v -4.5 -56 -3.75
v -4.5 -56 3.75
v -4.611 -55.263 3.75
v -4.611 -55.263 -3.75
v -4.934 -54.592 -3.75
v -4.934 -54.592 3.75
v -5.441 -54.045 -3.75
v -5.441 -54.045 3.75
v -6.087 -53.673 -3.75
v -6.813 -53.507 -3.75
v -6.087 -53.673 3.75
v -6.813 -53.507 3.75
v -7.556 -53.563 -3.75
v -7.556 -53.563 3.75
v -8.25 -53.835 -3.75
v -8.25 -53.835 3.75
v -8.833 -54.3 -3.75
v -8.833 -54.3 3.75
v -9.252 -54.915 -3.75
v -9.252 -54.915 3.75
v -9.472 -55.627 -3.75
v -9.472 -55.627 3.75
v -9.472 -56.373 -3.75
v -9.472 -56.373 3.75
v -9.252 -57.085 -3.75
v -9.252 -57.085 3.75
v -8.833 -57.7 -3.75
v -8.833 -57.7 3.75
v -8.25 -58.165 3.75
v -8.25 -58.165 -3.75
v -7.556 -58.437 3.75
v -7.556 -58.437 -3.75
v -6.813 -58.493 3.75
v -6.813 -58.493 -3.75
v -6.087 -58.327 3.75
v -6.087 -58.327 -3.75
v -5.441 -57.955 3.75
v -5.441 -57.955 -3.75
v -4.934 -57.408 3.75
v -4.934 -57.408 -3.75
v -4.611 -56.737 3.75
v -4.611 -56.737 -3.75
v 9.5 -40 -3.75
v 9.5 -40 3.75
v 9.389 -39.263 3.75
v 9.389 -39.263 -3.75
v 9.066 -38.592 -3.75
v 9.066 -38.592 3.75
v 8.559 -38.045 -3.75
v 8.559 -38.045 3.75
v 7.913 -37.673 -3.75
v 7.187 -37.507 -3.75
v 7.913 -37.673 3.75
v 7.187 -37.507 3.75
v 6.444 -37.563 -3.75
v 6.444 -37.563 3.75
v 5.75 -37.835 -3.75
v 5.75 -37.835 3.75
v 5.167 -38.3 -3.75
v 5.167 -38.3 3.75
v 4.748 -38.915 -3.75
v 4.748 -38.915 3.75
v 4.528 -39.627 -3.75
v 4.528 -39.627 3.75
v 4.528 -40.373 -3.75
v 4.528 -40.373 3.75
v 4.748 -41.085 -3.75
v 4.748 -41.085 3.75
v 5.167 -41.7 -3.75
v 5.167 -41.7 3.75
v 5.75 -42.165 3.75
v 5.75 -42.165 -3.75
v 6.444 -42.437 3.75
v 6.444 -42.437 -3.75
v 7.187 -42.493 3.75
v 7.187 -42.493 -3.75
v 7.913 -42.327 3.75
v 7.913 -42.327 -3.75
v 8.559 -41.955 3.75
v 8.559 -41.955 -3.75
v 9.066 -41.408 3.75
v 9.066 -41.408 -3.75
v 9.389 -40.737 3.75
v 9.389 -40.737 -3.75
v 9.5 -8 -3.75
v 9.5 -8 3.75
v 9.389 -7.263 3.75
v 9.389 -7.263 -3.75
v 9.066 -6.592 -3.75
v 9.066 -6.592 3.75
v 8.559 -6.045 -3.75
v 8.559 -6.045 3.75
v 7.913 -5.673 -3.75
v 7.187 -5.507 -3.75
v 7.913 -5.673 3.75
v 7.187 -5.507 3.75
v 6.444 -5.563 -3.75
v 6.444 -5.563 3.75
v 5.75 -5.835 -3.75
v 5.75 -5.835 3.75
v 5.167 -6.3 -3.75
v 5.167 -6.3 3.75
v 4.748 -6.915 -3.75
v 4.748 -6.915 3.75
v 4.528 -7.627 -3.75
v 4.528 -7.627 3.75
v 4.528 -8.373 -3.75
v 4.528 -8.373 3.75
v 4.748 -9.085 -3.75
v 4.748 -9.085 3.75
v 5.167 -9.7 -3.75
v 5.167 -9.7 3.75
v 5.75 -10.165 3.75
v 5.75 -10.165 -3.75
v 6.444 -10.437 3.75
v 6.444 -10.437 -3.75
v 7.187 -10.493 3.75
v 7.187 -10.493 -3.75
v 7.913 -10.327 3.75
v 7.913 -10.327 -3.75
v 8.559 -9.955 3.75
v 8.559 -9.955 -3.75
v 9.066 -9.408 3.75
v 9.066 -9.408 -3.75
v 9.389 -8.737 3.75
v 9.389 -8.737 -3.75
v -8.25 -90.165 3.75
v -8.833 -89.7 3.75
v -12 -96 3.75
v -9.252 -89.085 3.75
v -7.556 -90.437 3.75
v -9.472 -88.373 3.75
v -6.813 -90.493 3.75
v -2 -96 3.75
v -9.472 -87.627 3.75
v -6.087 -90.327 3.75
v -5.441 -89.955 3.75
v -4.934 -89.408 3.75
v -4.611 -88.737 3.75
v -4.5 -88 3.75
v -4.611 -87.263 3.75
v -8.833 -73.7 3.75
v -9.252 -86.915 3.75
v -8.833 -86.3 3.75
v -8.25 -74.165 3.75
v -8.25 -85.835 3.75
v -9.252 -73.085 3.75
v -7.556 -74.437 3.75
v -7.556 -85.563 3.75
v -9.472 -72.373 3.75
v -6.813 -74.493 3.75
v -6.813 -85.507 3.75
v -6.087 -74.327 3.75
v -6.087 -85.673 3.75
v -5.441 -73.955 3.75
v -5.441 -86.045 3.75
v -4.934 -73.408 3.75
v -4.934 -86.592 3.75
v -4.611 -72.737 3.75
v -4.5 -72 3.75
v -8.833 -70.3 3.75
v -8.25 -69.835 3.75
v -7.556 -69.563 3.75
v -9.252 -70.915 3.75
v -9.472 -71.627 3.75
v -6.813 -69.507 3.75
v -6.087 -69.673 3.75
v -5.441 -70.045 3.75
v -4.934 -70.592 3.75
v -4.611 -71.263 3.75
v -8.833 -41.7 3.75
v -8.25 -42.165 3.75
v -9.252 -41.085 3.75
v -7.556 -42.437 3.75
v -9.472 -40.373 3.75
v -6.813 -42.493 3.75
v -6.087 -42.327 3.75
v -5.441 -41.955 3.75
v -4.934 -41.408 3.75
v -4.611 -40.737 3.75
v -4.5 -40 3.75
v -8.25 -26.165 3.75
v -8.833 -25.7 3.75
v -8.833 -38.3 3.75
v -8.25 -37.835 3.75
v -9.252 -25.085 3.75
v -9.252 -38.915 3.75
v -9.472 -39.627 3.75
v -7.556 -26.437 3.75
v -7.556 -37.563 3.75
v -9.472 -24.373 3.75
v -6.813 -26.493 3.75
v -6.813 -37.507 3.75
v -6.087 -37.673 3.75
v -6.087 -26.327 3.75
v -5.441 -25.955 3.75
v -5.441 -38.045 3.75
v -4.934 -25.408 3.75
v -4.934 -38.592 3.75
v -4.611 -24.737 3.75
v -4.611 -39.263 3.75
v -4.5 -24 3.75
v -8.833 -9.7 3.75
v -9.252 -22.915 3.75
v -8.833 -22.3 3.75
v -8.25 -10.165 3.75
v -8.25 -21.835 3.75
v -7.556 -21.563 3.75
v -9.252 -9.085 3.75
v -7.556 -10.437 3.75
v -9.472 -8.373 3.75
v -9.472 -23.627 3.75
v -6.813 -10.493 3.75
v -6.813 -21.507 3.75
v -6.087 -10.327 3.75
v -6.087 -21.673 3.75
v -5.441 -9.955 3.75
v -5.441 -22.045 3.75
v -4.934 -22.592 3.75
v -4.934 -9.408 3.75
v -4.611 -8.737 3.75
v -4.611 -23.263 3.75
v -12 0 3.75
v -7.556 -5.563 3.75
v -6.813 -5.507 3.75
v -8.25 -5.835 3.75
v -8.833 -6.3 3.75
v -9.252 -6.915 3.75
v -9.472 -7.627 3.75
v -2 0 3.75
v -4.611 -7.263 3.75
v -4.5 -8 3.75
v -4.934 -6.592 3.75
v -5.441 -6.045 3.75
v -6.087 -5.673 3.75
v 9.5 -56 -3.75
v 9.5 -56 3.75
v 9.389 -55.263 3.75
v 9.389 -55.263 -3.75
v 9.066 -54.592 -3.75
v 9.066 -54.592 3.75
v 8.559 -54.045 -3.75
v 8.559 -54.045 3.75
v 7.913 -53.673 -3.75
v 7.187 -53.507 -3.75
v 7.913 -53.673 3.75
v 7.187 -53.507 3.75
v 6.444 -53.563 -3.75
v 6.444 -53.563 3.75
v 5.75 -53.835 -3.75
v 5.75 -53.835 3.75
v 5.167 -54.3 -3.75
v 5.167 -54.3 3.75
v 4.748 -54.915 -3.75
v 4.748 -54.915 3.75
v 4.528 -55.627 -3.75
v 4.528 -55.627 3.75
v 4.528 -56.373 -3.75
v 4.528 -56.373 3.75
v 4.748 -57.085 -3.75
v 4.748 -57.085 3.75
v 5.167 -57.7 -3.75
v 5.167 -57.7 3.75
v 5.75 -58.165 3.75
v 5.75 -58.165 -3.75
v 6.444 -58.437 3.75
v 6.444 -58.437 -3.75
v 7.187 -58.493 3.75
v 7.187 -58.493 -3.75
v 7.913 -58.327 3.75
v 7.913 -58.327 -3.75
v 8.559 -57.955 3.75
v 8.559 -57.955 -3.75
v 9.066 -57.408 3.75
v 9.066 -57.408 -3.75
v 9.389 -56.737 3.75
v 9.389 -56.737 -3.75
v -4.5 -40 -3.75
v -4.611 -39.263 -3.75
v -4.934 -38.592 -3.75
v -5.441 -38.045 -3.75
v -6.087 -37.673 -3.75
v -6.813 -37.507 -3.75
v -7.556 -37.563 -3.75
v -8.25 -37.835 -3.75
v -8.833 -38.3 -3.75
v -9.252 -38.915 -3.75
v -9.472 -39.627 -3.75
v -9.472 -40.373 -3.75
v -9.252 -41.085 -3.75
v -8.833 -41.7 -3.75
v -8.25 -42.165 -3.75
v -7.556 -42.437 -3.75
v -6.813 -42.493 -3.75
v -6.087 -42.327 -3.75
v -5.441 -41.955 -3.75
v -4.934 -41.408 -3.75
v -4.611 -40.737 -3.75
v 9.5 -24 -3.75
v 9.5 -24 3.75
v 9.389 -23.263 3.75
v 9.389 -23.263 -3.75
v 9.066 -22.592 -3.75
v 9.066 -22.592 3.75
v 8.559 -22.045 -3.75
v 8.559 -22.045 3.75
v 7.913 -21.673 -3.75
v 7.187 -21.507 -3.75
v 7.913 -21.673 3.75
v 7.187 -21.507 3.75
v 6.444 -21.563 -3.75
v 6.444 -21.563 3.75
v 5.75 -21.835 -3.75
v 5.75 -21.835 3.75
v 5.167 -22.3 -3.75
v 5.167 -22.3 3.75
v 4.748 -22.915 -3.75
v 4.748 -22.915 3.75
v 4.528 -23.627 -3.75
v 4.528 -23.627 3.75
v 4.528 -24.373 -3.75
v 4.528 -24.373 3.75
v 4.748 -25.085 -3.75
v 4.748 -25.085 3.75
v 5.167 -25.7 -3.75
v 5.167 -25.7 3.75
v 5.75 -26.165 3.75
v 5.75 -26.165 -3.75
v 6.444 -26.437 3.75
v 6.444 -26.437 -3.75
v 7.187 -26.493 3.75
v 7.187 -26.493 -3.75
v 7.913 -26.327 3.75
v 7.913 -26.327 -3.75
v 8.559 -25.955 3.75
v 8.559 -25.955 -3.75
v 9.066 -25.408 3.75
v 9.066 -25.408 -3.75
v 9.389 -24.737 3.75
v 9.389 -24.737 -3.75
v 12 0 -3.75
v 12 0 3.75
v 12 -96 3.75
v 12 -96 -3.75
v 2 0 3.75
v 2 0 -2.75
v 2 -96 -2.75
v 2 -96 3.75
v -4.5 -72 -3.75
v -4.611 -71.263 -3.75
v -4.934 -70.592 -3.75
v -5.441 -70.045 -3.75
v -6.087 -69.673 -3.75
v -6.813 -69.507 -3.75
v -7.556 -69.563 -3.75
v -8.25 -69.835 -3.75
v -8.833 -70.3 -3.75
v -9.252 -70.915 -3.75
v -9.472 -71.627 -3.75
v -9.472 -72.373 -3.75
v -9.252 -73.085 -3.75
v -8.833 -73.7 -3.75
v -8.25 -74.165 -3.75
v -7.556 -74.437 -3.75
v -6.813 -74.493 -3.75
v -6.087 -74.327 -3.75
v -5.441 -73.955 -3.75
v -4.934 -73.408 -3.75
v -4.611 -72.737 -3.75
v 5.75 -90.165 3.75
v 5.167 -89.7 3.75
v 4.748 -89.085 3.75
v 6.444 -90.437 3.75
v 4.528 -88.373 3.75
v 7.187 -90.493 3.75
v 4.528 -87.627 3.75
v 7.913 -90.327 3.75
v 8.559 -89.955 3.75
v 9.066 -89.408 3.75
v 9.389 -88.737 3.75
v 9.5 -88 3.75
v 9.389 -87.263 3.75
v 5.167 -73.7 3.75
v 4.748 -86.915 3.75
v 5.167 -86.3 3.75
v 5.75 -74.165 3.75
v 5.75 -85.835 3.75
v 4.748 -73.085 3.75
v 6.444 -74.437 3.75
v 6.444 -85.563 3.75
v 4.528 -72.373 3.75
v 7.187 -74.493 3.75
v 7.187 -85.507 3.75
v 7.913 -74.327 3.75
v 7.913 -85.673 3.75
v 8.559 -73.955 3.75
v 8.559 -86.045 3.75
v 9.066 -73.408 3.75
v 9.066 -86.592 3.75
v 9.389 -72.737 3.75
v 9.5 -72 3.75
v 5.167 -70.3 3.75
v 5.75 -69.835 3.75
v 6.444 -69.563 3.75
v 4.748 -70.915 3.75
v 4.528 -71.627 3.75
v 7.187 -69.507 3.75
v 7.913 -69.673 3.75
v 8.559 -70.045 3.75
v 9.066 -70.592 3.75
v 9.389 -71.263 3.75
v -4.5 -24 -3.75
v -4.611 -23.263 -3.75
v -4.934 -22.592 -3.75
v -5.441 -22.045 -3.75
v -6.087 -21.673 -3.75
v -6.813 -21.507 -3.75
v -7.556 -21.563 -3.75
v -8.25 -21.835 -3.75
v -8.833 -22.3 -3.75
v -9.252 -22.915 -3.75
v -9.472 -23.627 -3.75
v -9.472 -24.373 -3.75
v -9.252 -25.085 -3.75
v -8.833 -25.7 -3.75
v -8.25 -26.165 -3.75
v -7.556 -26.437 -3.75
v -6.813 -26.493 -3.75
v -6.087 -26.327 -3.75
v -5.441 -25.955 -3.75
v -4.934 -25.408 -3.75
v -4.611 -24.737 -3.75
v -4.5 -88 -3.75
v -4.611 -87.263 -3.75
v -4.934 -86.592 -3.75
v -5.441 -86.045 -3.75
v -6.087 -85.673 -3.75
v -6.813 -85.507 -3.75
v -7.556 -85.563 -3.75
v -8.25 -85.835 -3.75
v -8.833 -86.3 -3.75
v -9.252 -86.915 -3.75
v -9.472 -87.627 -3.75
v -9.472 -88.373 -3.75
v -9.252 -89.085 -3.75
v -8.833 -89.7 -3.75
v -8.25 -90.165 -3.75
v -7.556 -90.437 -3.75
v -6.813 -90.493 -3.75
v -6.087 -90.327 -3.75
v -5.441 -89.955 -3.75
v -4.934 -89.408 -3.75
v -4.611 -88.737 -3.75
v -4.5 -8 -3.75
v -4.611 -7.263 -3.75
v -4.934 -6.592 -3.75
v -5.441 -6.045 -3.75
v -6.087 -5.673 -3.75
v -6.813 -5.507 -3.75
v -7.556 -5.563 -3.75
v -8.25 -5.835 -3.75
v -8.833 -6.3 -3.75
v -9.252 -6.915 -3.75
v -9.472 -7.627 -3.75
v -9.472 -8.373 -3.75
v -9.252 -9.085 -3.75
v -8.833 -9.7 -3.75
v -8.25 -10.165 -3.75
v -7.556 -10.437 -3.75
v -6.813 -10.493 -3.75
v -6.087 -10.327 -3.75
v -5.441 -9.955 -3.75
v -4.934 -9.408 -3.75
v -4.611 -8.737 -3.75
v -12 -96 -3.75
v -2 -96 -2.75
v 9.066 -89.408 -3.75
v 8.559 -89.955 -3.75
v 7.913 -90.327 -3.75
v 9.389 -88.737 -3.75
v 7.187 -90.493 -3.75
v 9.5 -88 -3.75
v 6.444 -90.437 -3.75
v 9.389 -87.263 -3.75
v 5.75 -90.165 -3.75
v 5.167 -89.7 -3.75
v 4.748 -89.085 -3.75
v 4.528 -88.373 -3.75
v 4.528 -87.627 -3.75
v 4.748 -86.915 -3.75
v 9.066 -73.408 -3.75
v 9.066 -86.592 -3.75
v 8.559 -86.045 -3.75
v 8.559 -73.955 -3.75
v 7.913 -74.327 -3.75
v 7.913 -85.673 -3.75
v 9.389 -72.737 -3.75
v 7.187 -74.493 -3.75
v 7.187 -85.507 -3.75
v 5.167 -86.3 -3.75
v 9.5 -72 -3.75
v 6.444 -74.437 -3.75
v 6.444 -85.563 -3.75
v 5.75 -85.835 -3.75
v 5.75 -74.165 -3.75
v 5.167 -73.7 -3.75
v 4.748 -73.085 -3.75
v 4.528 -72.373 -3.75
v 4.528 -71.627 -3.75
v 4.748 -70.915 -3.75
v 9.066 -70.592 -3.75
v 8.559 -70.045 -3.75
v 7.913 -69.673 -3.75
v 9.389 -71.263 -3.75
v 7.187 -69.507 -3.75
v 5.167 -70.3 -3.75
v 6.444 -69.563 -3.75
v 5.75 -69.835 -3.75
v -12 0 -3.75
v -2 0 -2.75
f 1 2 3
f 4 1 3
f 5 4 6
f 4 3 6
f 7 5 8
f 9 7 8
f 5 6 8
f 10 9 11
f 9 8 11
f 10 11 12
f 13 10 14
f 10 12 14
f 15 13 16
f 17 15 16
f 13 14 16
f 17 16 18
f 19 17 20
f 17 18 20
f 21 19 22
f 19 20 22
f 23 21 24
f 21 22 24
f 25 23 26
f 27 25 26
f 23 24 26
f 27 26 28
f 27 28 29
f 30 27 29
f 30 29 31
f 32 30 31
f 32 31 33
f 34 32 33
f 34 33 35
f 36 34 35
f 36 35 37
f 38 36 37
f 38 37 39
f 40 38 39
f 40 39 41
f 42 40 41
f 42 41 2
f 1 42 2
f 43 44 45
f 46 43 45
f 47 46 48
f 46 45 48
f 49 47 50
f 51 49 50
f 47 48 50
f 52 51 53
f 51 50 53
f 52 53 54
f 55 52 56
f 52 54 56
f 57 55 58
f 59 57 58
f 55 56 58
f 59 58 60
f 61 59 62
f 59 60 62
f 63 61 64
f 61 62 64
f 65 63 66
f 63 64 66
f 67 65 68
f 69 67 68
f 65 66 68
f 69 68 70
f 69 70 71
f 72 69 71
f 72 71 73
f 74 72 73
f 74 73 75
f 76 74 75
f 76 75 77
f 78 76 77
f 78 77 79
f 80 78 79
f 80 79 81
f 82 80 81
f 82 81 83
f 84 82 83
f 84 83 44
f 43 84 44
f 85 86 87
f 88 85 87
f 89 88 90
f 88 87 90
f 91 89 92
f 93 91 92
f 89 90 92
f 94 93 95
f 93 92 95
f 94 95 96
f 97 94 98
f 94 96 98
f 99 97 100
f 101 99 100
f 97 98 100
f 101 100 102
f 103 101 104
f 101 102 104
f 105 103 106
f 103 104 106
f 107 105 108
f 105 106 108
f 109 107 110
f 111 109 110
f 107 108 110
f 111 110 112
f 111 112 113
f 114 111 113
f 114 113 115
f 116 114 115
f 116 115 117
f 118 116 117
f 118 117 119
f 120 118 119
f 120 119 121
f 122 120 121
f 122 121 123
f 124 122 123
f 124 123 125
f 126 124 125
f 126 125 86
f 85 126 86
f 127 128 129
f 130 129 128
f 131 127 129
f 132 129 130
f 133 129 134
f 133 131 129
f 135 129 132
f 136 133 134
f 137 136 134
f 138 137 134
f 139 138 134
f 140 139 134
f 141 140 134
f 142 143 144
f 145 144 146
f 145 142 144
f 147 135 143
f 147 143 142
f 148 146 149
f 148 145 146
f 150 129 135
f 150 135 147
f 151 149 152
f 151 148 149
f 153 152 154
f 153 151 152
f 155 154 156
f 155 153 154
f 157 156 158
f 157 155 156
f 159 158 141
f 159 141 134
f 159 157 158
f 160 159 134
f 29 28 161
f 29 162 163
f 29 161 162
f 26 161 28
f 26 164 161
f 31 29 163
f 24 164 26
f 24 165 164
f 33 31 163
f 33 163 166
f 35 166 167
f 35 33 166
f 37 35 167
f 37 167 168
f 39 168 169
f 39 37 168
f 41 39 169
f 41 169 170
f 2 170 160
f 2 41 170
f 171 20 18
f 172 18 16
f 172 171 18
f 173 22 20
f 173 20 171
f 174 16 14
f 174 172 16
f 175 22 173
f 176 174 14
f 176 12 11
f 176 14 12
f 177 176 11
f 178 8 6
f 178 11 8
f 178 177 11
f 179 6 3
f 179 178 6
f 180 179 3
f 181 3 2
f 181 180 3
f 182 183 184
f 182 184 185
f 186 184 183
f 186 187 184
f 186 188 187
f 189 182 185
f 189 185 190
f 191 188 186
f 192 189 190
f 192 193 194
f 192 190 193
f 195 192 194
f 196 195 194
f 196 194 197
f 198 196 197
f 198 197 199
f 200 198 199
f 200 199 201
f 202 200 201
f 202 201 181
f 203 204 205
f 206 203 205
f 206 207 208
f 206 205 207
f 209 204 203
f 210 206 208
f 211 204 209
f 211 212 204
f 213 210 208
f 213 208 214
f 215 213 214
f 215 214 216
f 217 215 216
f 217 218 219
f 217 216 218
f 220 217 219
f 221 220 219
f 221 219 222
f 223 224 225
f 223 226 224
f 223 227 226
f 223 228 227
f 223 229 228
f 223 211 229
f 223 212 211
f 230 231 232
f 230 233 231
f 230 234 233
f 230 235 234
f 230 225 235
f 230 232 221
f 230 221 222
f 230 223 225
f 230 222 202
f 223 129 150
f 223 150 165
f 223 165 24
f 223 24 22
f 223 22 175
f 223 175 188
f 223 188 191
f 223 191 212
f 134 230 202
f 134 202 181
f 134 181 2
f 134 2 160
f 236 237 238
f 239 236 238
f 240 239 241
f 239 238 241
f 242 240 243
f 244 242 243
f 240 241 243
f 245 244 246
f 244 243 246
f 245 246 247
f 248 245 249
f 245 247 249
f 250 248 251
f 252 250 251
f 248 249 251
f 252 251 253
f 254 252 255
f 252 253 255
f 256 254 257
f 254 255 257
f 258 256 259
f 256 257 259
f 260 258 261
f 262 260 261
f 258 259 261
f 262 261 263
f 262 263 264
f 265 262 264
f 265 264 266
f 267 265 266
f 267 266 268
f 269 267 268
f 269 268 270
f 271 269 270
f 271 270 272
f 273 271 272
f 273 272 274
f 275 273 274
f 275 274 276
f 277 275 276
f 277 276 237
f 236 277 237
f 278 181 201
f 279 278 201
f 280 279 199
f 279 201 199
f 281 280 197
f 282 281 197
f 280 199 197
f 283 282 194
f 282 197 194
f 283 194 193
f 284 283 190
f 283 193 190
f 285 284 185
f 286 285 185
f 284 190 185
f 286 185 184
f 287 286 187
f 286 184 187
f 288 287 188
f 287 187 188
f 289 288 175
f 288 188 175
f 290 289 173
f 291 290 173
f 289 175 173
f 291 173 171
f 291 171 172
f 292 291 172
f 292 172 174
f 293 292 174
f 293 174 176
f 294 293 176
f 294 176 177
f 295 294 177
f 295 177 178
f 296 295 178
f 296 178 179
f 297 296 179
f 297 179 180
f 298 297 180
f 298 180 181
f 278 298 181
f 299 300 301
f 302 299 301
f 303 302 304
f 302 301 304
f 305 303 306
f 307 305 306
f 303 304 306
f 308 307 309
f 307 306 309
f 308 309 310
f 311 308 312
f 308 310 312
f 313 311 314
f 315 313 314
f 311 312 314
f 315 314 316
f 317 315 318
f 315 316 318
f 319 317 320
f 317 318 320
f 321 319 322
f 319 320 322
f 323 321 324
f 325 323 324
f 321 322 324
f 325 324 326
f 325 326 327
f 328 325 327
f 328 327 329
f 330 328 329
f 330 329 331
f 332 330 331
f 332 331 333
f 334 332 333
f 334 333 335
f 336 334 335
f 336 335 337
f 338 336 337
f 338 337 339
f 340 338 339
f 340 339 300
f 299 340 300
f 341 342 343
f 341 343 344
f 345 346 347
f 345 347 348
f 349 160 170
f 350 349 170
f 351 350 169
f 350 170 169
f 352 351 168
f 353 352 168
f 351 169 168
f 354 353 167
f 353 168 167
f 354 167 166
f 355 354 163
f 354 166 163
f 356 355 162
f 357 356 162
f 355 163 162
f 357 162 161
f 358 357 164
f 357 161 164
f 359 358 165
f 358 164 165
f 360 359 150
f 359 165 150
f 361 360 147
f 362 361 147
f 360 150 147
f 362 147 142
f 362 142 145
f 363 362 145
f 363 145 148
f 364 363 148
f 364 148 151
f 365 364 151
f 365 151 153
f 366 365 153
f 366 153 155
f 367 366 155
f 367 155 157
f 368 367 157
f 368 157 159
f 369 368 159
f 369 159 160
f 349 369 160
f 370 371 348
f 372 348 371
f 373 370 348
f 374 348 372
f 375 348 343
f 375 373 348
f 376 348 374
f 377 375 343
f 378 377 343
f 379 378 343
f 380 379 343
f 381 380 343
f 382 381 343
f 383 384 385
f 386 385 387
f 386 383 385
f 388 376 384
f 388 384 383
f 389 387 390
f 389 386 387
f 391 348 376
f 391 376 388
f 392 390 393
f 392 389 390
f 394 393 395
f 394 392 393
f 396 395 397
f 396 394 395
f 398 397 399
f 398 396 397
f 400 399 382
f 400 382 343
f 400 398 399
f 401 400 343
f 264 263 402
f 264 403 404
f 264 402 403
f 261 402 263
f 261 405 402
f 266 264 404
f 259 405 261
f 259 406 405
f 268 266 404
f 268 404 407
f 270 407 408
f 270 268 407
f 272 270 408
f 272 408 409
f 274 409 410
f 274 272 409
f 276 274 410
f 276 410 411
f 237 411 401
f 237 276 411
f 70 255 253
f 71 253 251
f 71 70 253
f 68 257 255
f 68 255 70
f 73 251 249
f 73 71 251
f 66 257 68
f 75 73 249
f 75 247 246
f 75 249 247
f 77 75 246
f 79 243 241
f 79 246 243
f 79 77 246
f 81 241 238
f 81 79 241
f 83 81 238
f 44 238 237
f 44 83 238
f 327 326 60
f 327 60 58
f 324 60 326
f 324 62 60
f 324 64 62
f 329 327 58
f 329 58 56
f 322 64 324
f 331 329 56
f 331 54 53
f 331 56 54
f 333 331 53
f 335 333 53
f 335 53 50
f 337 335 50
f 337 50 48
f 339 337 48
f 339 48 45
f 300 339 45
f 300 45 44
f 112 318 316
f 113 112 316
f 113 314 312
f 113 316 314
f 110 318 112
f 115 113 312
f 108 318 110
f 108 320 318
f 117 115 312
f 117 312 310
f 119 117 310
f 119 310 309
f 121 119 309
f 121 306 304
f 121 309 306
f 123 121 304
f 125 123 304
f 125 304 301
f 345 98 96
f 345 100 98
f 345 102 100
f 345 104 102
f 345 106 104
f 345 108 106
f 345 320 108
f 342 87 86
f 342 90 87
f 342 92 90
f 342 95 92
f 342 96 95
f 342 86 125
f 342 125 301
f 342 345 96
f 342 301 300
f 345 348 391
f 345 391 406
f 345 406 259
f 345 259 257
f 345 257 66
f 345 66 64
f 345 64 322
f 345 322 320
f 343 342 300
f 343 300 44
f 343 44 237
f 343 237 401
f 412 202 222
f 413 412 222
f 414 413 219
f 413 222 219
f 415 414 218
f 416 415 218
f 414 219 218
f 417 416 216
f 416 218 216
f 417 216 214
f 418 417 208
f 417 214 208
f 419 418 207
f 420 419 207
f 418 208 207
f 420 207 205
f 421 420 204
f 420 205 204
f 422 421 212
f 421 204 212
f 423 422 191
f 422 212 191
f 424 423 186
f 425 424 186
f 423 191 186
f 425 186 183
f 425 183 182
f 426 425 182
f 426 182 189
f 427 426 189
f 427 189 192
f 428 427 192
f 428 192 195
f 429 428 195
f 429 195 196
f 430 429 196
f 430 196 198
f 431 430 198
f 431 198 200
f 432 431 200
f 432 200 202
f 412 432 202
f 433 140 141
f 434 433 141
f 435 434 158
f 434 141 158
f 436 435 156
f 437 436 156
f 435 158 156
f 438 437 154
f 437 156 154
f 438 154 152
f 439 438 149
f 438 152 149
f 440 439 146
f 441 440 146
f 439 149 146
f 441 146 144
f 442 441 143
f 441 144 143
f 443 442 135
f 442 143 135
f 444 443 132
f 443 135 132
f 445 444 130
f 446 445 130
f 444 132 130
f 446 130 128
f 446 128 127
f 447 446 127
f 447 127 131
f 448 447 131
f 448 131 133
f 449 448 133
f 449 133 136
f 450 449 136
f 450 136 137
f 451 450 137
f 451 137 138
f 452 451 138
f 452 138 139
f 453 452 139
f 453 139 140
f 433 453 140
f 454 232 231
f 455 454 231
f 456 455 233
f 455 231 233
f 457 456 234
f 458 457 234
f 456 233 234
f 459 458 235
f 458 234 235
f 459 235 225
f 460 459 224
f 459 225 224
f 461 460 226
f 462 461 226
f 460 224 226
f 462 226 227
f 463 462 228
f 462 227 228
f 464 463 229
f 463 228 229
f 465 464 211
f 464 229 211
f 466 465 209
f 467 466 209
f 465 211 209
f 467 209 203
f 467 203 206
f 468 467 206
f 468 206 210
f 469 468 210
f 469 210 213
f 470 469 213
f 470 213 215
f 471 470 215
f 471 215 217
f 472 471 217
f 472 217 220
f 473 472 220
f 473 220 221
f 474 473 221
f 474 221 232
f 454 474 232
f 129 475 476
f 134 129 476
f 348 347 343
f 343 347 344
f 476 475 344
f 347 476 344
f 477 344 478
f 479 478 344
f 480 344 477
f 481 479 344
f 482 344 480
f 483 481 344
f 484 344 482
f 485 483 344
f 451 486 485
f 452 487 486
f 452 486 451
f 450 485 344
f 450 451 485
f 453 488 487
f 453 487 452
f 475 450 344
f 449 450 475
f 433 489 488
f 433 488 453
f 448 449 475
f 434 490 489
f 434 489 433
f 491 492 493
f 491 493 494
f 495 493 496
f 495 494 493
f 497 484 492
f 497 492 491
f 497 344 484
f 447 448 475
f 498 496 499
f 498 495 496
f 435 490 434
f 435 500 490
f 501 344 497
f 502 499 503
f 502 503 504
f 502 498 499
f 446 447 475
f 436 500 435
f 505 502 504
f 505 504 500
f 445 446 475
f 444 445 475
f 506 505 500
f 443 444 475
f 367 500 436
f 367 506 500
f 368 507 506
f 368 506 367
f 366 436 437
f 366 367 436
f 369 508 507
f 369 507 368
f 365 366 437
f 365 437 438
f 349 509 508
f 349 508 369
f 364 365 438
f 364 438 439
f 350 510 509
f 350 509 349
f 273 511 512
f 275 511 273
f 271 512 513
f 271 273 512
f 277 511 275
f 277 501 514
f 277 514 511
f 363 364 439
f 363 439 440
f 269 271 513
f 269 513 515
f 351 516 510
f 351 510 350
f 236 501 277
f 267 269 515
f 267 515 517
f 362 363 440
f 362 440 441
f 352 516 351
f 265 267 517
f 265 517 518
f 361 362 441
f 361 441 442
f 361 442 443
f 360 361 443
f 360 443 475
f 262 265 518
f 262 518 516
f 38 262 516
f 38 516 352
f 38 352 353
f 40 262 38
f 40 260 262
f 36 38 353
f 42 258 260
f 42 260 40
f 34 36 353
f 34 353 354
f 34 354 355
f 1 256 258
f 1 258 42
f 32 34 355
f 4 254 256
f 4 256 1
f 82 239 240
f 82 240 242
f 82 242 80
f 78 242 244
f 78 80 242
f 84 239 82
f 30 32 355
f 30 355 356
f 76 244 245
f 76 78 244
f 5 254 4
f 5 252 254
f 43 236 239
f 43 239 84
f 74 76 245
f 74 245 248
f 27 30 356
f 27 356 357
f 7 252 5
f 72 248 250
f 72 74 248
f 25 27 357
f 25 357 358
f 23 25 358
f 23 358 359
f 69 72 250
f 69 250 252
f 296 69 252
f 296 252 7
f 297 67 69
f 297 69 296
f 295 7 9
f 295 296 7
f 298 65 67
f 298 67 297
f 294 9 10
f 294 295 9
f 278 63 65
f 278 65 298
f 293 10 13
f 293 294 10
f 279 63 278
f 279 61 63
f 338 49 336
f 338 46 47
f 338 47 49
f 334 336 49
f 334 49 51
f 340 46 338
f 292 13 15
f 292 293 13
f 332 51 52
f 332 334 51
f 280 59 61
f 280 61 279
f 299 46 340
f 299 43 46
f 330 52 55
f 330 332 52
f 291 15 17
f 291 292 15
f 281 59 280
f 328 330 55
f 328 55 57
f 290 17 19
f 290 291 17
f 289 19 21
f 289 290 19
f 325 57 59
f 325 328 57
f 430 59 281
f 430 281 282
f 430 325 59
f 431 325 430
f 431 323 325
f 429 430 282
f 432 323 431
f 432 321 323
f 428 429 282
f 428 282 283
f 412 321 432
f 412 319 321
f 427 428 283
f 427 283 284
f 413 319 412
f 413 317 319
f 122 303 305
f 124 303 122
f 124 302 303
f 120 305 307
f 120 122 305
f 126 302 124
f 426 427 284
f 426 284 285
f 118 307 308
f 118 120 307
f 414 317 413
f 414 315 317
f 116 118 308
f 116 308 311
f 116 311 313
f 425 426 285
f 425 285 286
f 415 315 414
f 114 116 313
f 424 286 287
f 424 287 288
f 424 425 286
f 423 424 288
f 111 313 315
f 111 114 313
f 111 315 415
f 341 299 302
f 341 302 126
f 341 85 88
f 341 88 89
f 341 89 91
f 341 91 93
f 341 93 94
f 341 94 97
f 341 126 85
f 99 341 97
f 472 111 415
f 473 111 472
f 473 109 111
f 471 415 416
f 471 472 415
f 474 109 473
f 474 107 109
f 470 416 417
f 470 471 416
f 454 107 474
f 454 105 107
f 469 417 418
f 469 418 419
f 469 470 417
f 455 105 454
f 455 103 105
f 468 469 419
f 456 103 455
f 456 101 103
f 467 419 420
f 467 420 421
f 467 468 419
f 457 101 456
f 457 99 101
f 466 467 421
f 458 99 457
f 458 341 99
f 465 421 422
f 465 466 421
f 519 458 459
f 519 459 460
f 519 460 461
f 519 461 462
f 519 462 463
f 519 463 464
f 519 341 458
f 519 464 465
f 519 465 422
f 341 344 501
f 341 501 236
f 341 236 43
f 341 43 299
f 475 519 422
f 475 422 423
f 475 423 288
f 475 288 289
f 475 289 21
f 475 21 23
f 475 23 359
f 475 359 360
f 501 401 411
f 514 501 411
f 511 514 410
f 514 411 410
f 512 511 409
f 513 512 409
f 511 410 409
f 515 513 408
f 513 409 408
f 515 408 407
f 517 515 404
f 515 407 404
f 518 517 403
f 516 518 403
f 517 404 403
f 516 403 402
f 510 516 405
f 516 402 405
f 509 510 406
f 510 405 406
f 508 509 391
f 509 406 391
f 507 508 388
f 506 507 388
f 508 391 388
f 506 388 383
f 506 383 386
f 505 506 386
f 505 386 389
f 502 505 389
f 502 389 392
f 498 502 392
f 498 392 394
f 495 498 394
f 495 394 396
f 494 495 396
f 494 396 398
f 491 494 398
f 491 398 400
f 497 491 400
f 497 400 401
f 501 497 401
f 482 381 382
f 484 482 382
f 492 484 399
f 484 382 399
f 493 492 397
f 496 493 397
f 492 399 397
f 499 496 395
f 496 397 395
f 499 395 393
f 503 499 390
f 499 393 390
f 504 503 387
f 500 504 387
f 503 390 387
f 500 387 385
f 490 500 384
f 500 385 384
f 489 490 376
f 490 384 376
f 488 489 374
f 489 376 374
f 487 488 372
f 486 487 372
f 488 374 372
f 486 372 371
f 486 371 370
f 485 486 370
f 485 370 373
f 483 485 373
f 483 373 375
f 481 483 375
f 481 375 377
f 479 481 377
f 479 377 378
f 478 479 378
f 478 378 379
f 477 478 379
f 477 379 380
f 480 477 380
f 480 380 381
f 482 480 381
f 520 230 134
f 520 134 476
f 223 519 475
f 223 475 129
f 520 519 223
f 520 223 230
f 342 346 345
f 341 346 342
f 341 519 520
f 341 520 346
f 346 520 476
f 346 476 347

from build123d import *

# Parameters (mm, degrees)
BASE_DEPTH  = 96
ESQUISSE2_R = 2.5
TROU_DEPTH  = 98.037363938


with BuildPart() as part:
    # Esquisse1 → BASE (new body)
    with BuildSketch(Plane(origin=(0, 0, 0), x_dir=(1, 0, 0), z_dir=(0, 1, 0))):
        Polygon((-2, -3.75), (-2, 2.75), (2, 2.75), (2, -3.75), (12, -3.75), (12, 3.75), (-12, 3.75), (-12, -3.75), align=None)
    extrude(amount=-BASE_DEPTH)

    # Esquisse2 → TROU (cut, through all)
    with BuildSketch(Plane.XY.offset(3.75)):
        with Locations((-7, -8)):
            Circle(ESQUISSE2_R)
        with Locations((7, -8)):
            Circle(ESQUISSE2_R)
        with Locations((7, -24)):
            Circle(ESQUISSE2_R)
        with Locations((7, -40)):
            Circle(ESQUISSE2_R)
        with Locations((7, -56)):
            Circle(ESQUISSE2_R)
        with Locations((7, -72)):
            Circle(ESQUISSE2_R)
        with Locations((7, -88)):
            Circle(ESQUISSE2_R)
        with Locations((-7, -24)):
            Circle(ESQUISSE2_R)
        with Locations((-7, -40)):
            Circle(ESQUISSE2_R)
        with Locations((-7, -56)):
            Circle(ESQUISSE2_R)
        with Locations((-7, -72)):
            Circle(ESQUISSE2_R)
        with Locations((-7, -88)):
            Circle(ESQUISSE2_R)
    extrude(amount=-TROU_DEPTH, mode=Mode.SUBTRACT)


solid = part.part
